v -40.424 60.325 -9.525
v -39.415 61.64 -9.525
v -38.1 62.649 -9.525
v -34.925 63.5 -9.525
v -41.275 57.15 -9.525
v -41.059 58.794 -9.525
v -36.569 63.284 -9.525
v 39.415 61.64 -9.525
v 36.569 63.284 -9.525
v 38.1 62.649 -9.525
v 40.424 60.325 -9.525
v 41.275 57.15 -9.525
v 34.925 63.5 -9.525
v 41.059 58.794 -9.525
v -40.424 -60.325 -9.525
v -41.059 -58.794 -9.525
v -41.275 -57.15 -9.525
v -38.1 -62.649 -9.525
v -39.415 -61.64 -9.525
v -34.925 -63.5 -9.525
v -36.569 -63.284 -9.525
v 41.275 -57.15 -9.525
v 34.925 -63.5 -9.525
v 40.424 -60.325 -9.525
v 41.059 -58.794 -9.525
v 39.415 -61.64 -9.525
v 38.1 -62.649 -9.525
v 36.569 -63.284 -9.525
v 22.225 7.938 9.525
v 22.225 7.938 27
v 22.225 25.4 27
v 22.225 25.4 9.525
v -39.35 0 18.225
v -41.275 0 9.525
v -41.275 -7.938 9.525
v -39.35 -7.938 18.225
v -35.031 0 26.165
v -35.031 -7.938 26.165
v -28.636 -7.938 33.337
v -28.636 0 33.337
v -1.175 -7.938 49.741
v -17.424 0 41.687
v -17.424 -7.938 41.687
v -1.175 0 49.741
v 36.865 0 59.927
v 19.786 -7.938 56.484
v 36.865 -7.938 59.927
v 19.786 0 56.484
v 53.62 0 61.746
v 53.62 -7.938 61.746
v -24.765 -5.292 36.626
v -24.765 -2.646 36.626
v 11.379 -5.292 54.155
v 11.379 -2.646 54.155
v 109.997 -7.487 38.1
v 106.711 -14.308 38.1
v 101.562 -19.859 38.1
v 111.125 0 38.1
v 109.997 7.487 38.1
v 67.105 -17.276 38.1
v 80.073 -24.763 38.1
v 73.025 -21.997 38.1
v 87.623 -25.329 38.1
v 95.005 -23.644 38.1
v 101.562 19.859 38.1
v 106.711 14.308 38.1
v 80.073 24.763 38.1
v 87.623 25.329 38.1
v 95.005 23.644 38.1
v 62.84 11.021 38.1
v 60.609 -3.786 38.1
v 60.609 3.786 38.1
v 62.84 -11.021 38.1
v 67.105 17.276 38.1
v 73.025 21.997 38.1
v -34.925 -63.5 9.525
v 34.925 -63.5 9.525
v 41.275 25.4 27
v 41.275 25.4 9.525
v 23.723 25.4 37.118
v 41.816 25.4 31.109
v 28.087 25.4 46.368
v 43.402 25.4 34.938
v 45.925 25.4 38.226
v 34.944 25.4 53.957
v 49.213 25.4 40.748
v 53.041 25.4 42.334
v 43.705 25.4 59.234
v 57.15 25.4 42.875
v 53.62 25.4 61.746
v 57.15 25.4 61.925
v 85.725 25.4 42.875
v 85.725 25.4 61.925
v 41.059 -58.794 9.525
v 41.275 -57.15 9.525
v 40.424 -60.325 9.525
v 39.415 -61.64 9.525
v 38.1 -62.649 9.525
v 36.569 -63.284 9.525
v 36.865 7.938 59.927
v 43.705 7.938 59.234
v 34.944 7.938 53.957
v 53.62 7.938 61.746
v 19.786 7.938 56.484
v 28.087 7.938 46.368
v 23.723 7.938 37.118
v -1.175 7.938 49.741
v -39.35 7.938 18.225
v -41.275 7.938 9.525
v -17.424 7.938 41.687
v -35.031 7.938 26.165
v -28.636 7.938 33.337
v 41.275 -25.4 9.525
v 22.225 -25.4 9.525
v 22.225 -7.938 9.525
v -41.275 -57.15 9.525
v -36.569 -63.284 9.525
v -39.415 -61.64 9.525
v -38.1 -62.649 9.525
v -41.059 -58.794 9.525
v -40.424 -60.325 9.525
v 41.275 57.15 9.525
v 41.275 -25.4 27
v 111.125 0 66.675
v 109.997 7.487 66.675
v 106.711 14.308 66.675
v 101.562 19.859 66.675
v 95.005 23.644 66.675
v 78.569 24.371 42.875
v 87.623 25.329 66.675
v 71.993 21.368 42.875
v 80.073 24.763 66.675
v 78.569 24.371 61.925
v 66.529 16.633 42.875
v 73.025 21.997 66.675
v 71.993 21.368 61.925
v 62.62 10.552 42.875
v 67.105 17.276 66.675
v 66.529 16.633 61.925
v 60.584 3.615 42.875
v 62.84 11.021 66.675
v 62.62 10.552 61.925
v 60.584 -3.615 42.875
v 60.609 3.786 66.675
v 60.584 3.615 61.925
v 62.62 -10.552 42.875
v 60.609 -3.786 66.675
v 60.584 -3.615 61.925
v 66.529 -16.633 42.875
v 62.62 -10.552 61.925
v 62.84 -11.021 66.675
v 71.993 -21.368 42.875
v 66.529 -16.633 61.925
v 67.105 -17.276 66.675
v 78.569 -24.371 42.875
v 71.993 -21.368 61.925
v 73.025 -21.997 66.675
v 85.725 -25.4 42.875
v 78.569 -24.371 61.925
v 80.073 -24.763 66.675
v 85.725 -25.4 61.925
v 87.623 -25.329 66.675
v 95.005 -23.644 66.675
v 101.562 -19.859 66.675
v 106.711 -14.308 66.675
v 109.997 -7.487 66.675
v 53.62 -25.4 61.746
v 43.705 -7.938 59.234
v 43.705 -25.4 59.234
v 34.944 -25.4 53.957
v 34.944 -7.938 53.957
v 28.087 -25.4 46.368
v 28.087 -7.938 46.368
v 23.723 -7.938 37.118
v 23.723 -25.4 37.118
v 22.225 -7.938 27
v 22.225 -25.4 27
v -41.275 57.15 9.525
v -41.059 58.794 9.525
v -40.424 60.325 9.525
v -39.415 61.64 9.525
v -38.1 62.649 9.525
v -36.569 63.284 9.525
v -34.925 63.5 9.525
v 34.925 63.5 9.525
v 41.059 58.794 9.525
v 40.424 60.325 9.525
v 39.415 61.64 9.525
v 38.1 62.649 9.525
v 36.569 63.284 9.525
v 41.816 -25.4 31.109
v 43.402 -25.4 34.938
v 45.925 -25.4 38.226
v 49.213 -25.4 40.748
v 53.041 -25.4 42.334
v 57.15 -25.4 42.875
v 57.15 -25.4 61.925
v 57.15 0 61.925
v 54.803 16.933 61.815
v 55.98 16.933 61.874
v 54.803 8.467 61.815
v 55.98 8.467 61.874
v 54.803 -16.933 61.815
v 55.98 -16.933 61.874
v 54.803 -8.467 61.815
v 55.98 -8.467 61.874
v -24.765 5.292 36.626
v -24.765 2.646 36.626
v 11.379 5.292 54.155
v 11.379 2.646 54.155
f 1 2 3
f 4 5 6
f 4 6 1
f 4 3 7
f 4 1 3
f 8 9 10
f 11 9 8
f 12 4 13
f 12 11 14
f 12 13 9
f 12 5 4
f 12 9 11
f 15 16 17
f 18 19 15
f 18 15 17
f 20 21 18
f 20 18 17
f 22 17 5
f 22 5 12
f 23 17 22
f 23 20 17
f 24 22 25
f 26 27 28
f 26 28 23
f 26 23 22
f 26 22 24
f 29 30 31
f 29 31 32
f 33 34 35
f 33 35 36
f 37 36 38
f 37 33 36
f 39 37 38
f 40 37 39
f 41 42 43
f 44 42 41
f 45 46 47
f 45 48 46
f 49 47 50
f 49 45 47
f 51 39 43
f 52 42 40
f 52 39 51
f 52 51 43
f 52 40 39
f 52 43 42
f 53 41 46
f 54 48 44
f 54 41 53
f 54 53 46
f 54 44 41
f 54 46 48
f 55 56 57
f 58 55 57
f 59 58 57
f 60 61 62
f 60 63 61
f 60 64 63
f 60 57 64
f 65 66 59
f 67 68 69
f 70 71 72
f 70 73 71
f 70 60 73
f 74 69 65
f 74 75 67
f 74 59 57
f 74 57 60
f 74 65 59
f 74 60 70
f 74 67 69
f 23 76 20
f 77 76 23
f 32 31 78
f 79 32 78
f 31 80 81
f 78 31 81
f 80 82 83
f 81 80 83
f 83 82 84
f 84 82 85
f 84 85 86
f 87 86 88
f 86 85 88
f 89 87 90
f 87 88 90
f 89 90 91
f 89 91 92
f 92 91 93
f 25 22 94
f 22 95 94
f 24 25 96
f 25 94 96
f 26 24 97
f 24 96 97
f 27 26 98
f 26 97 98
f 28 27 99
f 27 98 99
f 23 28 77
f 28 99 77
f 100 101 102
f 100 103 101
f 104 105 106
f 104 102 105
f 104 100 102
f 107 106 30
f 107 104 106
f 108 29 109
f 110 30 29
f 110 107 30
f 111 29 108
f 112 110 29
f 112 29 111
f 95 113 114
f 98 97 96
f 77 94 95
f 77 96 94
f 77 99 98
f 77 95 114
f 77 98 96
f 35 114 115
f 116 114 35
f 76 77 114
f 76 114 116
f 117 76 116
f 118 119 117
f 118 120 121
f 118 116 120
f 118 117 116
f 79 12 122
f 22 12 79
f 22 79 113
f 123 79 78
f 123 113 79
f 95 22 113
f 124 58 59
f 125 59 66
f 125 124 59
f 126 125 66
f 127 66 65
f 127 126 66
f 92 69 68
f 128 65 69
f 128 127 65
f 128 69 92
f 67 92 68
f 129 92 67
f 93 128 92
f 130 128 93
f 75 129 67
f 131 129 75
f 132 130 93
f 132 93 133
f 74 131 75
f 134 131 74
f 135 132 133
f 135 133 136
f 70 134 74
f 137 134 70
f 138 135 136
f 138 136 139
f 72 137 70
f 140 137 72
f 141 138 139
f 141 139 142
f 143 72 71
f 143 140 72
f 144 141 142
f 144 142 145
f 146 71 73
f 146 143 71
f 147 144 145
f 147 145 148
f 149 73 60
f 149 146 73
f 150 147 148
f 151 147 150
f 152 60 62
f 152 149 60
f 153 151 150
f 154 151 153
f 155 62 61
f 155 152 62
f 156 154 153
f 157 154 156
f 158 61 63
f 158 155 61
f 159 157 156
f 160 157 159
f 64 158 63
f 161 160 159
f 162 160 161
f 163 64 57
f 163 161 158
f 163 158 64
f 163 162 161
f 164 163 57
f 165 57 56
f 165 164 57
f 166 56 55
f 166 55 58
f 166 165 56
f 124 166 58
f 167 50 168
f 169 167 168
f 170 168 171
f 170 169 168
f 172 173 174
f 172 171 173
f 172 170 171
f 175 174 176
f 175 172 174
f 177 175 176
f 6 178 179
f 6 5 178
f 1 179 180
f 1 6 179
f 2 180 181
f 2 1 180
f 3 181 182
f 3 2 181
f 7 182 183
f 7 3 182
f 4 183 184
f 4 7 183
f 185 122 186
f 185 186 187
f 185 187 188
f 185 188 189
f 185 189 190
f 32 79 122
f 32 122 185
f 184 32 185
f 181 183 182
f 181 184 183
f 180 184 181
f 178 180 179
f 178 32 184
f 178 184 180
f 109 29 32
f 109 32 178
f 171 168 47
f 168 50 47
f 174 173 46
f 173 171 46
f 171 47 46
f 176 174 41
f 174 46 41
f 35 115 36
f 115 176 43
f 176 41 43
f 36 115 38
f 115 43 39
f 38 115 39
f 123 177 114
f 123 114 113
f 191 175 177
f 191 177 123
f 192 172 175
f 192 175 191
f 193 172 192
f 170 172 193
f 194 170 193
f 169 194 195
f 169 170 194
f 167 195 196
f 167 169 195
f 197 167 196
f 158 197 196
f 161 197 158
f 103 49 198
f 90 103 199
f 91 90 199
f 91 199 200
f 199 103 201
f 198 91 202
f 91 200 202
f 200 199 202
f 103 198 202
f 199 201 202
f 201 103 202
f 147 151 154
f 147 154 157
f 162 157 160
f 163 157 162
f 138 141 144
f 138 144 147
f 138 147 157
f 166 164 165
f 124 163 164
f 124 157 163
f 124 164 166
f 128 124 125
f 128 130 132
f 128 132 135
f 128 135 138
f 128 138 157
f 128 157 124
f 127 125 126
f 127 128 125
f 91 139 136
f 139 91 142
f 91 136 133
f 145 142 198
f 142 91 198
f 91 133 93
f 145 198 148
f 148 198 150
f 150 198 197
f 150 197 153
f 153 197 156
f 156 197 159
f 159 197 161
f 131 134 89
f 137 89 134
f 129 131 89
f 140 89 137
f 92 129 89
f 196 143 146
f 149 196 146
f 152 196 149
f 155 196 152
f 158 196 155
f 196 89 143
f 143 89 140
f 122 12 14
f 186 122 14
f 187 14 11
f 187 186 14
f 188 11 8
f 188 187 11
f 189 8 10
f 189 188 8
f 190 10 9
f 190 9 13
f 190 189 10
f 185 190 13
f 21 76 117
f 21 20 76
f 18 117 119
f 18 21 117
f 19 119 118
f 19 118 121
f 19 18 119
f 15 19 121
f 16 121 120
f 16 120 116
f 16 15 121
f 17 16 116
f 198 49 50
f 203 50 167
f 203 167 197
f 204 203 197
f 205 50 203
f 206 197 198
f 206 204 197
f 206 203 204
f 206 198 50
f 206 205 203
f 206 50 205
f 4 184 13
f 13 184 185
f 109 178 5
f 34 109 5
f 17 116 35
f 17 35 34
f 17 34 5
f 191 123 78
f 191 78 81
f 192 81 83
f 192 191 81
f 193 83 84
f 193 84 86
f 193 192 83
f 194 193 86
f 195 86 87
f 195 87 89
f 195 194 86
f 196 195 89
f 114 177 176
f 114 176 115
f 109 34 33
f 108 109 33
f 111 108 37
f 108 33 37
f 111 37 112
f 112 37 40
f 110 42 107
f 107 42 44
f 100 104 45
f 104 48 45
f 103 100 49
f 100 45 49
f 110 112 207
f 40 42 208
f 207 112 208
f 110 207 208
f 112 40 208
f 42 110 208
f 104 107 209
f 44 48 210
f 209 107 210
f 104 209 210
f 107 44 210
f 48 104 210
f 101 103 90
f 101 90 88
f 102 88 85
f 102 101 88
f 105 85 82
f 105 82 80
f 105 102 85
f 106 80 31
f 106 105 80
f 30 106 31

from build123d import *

# Parameters (mm, degrees)
F1_DEPTH = 63.5
F2_DEPTH = 25.4
F0_W     = 25.4
F0_H     = 19.05
F3_DEPTH = 25.4
F4_DEPTH = 7.9375
F6_R     = 6.35


with BuildPart() as f1:
    # F0 (on Front) → F1 (new body, symmetric)
    with BuildSketch(Plane.XZ):
        Polygon((-41.275, 9.525), (-41.275, -9.525), (41.275, -9.525), (41.275, 9.525), (22.225, 9.525), align=None)
    extrude(amount=F1_DEPTH, both=True)

    # F0 (on Front) → F2 (join, symmetric)
    with BuildSketch(Plane.XZ):
        with BuildLine():
            Line((22.225, 9.525), (41.275, 9.525))
            Line((41.275, 9.525), (41.275, 27.0002))
            ThreePointArc((41.275, 27.0002), (45.9246798487, 38.2255201513), (57.15, 42.8752))
            Line((57.15, 42.8752), (60.325, 42.8752))
            Line((60.325, 42.8752), (60.325, 61.9252))
            Line((60.325, 61.9252), (57.15, 61.9252))
            add(Edge.make_bspline(
                [(53.6196332625, 61.7463096484), (54.8063742239, 61.8190464484), (55.9836636447, 61.878690137), (57.15, 61.9252)],
                knots=[108.3511799564, 108.3511799564, 108.3511799564, 108.3511799564, 111.5045361635, 111.5045361635, 111.5045361635, 111.5045361635], degree=3))
            ThreePointArc((53.6196332625, 61.7463096484), (31.2361650531, 50.4144858816), (22.225, 27.0002))
            Line((22.225, 27.0002), (22.225, 9.525))
        make_face()
    extrude(amount=F2_DEPTH, both=True)

    # F0 (on Front) → F3 (join, symmetric)
    with BuildSketch(Plane.XZ):
        with Locations((73.025, 52.4002)):
            Rectangle(F0_W, F0_H)
    extrude(amount=F3_DEPTH, both=True)

    # F0 (on Front) → F4 (join, symmetric)
    with BuildSketch(Plane.XZ):
        with BuildLine():
            add(Edge.make_bspline(
                [(-41.275, 9.525), (-39.0935689496, 41.2893669107), (12.8425135763, 59.2470302808), (53.6196332625, 61.7463096484)],
                knots=[0, 0, 0, 0, 108.3511799564, 108.3511799564, 108.3511799564, 108.3511799564], degree=3))
            Line((-41.275, 9.525), (22.225, 9.525))
            Line((22.225, 9.525), (22.225, 27.0002))
            ThreePointArc((22.225, 27.0002), (31.2361650531, 50.4144858816), (53.6196332625, 61.7463096484))
        make_face()
    extrude(amount=F4_DEPTH, both=True)

    # F0 (on Front) → F5 (revolve)
    with BuildSketch(Plane.XZ):
        Polygon((85.725, 66.675), (85.725, 61.9252), (85.725, 42.8752), (85.725, 38.1), (111.125, 38.1), (111.125, 66.675), align=None)
    revolve(axis=Axis((85.725, 0, 52.3875), (0, 0, 1)))

    # F6
    f6_edges = [f1.edges().sort_by_distance(p)[0] for p in [
        (41.275, -63.5, 0),
        (41.275, 63.5, 0),
        (-41.275, -63.5, 0),
        (-41.275, 63.5, 0),
    ]]
    fillet(f6_edges, radius=F6_R)


solid = f1.part
